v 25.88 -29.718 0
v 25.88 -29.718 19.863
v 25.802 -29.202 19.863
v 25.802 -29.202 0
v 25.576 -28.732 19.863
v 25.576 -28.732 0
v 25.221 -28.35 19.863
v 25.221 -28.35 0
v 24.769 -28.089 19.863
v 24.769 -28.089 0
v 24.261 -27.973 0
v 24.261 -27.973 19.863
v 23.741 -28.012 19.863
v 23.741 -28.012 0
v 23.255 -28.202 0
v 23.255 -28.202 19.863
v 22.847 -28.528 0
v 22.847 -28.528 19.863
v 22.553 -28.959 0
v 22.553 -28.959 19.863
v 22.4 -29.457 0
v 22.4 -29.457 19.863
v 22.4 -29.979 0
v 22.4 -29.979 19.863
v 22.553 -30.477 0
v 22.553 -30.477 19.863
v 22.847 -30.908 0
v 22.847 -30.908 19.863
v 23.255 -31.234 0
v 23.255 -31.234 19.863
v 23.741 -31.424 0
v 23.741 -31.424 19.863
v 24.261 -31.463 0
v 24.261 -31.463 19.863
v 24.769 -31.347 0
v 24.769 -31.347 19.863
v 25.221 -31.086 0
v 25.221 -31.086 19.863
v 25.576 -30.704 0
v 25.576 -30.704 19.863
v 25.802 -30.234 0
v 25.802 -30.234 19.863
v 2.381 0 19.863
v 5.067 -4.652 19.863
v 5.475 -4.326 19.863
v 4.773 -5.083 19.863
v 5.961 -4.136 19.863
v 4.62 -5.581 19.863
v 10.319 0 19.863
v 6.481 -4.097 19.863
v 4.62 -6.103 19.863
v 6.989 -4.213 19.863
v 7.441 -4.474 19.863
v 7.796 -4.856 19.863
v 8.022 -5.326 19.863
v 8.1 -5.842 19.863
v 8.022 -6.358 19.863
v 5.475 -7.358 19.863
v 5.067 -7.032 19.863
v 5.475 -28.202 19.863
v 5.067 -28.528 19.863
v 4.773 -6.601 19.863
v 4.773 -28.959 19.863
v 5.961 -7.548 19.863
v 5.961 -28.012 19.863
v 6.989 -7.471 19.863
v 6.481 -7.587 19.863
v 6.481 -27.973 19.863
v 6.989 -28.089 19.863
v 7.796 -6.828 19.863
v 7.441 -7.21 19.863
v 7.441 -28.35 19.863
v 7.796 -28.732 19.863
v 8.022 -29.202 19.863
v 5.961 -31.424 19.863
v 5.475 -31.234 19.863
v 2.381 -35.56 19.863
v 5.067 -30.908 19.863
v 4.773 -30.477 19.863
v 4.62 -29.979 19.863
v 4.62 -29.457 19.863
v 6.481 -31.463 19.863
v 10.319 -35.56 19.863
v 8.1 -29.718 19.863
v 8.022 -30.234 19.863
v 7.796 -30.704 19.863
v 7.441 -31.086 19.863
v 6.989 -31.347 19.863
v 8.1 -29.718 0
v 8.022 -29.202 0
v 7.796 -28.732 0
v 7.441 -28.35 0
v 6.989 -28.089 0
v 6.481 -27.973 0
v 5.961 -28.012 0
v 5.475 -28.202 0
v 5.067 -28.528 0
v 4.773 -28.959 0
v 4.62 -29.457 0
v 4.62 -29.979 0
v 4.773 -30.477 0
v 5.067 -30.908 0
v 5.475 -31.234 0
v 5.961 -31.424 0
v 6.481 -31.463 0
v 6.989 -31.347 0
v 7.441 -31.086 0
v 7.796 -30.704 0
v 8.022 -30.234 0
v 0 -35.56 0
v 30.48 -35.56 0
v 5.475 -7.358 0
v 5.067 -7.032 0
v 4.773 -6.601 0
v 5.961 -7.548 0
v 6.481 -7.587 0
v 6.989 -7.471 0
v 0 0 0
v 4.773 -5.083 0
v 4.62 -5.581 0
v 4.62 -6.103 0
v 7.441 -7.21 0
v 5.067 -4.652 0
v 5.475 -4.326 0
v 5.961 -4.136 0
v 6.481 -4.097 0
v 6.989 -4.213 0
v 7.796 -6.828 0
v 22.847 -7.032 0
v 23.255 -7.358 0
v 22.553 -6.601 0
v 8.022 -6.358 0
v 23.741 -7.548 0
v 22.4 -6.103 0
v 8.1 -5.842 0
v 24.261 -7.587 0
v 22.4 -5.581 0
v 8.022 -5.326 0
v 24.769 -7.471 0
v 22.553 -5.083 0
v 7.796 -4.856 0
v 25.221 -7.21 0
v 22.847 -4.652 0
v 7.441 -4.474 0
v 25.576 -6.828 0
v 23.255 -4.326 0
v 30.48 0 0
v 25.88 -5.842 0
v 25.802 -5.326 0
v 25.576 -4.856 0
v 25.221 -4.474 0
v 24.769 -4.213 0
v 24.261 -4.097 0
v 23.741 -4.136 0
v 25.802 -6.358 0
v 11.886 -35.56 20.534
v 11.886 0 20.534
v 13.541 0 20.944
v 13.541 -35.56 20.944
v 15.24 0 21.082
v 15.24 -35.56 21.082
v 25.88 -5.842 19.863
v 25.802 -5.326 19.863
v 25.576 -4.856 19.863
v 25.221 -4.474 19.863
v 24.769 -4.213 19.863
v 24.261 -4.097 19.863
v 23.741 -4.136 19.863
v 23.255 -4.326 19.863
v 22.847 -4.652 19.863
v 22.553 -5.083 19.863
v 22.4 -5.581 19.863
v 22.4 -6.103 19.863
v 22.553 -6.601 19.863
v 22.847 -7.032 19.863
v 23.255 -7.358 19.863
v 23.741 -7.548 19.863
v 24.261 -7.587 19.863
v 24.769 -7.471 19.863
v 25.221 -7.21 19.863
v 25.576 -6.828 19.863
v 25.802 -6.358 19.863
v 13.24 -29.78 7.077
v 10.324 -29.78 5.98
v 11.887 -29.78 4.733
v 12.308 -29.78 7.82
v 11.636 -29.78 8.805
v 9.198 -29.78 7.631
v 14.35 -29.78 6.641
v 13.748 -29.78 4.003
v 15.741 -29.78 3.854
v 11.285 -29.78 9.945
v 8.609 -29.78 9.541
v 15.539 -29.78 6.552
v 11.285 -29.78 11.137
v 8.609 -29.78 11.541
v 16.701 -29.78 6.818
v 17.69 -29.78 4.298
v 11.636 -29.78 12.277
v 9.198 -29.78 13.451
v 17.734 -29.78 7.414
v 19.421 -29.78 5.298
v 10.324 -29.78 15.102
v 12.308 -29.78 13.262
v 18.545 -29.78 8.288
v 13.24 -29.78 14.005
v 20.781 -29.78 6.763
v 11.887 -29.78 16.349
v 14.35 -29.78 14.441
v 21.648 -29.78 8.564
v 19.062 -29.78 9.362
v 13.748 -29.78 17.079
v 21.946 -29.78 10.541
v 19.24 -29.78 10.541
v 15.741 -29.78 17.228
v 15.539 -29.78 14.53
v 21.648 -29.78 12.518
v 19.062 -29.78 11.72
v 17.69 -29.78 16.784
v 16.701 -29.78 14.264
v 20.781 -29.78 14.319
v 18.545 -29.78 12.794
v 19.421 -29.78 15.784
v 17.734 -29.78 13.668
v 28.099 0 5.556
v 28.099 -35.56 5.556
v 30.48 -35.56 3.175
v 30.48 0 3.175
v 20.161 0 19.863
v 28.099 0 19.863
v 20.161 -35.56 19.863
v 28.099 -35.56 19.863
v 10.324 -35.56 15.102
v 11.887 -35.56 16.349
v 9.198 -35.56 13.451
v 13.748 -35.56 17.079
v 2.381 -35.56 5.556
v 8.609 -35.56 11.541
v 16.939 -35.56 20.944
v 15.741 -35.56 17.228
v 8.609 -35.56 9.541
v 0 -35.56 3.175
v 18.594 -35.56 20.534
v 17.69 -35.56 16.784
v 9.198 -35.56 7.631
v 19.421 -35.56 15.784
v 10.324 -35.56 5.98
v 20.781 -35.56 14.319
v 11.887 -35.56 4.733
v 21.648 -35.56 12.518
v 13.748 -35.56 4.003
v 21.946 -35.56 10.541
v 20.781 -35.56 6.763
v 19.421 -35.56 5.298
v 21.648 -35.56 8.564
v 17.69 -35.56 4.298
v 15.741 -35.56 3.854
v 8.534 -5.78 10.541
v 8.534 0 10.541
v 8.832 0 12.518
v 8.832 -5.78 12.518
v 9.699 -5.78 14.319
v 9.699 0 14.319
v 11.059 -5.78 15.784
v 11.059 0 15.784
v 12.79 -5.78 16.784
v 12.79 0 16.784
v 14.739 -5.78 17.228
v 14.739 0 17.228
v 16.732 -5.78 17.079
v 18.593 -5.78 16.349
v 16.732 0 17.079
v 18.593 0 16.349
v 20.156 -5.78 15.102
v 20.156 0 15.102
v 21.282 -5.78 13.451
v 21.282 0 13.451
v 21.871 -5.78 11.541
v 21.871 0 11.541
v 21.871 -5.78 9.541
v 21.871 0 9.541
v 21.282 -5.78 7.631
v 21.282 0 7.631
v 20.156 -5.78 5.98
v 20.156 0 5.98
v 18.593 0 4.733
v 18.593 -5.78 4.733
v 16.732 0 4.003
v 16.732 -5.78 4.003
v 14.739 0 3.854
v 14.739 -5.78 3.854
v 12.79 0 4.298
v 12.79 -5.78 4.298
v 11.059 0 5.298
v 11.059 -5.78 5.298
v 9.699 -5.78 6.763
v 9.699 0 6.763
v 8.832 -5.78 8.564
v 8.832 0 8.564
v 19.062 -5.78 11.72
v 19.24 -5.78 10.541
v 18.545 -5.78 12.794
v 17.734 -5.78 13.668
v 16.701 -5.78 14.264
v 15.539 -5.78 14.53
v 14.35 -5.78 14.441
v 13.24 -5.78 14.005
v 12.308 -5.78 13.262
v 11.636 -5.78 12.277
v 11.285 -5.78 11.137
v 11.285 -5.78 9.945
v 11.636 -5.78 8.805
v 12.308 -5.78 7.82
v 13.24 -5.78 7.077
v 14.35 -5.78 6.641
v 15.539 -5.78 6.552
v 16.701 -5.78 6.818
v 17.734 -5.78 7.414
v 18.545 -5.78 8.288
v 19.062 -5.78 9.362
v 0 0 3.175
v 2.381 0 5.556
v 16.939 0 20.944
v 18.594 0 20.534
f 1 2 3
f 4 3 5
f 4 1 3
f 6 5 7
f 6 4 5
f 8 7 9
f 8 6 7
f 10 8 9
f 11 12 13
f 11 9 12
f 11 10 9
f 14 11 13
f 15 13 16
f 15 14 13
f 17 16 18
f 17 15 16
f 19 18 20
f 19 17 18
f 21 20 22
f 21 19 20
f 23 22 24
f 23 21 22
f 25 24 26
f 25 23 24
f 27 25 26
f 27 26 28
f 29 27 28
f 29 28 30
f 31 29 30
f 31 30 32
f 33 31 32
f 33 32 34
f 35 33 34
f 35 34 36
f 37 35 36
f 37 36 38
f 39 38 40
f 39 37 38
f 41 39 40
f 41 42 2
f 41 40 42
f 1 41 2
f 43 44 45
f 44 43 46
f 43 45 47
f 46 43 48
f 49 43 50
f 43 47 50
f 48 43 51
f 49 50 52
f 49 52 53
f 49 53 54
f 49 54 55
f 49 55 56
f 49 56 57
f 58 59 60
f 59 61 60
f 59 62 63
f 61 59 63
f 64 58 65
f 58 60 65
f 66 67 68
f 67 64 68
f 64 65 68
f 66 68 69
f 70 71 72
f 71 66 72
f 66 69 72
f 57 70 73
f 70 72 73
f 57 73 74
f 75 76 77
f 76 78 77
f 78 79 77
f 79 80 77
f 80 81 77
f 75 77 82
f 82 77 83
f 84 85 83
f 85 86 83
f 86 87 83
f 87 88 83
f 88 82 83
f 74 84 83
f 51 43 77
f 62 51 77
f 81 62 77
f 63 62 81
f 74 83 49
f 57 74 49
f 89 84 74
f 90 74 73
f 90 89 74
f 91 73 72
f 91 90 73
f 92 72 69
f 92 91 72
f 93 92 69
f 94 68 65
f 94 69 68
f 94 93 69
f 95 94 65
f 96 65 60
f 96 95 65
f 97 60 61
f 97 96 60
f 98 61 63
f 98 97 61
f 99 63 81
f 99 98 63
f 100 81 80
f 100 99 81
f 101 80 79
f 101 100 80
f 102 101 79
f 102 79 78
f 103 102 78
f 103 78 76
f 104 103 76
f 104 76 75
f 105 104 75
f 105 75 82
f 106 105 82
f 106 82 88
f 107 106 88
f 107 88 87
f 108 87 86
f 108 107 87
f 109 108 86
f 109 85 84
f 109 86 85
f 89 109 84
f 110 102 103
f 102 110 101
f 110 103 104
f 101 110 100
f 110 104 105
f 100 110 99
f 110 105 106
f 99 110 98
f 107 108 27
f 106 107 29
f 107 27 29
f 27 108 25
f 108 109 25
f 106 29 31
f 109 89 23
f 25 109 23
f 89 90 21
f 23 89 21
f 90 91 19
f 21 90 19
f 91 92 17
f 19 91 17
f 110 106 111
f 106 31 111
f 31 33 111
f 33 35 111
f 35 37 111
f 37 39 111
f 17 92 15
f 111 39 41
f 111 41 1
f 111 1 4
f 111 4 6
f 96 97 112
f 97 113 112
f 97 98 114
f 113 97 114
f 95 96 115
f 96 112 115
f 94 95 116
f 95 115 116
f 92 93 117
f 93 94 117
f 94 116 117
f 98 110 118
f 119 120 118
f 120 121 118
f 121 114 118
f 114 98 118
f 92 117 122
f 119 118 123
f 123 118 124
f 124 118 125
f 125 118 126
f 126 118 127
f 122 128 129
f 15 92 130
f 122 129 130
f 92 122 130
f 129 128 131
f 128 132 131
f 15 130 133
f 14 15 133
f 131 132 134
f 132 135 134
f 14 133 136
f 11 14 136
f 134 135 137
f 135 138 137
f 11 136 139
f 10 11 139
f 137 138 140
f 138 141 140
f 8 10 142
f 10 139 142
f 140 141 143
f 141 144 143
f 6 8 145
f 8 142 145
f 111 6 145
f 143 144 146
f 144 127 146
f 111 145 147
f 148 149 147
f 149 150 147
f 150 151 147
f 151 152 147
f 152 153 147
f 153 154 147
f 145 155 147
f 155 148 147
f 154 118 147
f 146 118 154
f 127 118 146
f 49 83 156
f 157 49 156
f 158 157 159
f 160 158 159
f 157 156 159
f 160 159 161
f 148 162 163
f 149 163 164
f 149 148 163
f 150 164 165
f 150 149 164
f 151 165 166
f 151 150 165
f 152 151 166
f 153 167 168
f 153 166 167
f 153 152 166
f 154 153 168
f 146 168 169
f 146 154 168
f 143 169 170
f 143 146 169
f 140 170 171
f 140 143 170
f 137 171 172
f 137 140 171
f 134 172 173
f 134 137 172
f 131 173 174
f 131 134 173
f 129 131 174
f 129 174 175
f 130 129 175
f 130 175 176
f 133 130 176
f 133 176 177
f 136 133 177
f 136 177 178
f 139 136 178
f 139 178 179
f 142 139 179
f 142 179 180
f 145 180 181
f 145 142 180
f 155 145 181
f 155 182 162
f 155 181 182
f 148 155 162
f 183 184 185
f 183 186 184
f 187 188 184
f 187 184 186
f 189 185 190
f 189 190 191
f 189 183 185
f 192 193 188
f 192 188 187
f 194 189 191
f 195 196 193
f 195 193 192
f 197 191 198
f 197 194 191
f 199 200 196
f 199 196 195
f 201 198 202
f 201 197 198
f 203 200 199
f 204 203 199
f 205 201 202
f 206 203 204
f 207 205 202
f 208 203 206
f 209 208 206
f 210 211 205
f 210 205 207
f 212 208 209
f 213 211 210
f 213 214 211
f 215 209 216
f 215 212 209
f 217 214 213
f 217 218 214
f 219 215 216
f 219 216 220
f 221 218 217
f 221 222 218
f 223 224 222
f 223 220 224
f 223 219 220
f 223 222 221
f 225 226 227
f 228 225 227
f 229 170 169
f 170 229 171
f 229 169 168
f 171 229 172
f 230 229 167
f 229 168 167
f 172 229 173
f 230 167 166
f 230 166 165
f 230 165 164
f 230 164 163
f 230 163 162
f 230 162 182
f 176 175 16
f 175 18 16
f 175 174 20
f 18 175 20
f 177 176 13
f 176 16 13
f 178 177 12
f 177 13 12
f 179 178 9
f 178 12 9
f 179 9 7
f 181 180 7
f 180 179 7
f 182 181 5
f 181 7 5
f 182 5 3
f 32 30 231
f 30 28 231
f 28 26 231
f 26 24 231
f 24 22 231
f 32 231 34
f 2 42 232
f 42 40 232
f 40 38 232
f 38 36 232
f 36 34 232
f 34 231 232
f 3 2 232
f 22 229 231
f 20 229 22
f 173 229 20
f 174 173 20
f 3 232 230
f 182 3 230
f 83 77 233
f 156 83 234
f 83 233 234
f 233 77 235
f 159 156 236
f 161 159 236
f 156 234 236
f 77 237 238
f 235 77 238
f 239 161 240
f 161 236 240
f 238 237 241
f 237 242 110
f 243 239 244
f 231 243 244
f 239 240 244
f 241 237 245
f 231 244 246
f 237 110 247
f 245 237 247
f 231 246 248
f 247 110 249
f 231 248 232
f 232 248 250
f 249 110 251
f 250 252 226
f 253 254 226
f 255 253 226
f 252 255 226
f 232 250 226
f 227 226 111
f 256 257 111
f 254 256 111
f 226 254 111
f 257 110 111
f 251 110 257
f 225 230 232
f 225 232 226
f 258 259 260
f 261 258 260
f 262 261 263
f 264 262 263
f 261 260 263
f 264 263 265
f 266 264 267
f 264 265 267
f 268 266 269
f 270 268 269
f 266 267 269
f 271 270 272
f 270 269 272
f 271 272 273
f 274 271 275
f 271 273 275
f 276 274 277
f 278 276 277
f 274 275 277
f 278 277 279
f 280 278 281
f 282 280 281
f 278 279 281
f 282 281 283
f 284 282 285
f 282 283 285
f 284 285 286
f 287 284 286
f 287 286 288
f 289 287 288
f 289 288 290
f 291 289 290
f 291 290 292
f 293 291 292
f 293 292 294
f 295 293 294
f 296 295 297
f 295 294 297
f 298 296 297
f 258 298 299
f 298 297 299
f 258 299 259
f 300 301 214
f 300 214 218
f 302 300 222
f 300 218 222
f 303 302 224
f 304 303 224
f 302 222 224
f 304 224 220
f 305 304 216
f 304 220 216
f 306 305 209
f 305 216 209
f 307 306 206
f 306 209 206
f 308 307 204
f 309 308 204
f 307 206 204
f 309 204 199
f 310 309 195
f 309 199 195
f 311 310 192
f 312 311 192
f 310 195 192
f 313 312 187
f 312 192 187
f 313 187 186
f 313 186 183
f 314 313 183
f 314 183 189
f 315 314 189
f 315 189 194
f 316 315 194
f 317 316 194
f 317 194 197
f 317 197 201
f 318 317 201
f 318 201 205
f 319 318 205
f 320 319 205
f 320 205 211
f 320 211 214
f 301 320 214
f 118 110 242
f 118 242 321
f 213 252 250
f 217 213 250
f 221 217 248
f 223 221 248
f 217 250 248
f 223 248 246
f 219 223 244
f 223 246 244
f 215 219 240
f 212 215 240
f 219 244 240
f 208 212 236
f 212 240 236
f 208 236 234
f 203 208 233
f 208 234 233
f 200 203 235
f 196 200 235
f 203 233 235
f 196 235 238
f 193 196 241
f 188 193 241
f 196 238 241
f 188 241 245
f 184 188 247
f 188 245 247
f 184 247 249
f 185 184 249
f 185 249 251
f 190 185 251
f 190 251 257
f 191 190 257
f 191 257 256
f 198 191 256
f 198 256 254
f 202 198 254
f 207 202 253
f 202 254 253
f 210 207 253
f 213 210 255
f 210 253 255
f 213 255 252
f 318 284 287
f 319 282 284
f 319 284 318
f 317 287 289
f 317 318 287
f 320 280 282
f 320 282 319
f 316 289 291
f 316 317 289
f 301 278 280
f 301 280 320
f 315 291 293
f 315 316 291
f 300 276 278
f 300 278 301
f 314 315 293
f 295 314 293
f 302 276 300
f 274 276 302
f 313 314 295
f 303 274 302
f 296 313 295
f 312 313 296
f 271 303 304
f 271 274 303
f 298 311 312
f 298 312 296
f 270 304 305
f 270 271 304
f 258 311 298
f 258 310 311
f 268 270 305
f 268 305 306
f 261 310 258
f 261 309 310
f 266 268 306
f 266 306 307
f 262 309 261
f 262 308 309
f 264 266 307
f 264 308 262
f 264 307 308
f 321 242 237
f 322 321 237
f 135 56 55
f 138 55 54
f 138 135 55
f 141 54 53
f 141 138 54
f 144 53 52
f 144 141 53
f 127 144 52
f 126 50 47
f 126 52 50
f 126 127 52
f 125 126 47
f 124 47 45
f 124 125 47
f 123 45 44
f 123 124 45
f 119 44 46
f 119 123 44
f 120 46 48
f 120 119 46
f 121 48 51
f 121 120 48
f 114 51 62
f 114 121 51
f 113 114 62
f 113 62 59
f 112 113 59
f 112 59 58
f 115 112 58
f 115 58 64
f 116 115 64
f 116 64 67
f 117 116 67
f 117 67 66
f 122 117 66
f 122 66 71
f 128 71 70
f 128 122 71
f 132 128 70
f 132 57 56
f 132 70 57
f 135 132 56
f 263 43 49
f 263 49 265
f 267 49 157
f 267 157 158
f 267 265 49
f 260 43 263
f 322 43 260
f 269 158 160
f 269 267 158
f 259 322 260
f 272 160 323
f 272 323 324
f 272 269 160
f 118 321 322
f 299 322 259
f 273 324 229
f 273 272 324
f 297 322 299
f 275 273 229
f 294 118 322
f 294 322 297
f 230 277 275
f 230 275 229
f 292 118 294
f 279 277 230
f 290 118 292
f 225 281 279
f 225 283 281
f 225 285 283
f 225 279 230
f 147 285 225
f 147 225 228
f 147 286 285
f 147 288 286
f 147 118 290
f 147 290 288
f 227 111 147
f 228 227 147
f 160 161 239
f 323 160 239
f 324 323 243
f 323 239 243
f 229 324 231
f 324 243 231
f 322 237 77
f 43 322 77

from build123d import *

# Parameters (mm, degrees)
F0_W     = 30.48
F0_H     = 35.56
F0_R     = 1.75
F1_DEPTH = 21.082
F2_R     = 4
F3_DEPTH = 35.56
F4_R     = 6.706248
F5_DEPTH = 5.779999
F6_R     = 6.706248
F7_DEPTH = 5.779999


with BuildPart() as f1:
    # F0 (on Top) → F1 (new body)
    with BuildSketch(Plane.XY):
        with Locations((15.24, -17.78)):
            Rectangle(F0_W, F0_H)
        with Locations((6.35, -29.718)):
            Circle(F0_R, mode=Mode.SUBTRACT)
        with Locations((24.13, -29.718)):
            Circle(F0_R, mode=Mode.SUBTRACT)
        with Locations((6.35, -5.842)):
            Circle(F0_R, mode=Mode.SUBTRACT)
        with Locations((24.13, -5.842)):
            Circle(F0_R, mode=Mode.SUBTRACT)
    extrude(amount=F1_DEPTH)

    # F2 (on face) → F3 (cut, through all)
    with BuildSketch(Plane.XZ.offset(35.56)):
        with Locations((15.24, 10.541)):
            Circle(F2_R)
        with BuildLine():
            ThreePointArc((10.31875, 19.862694), (12.704975, 20.772634), (15.24, 21.082))
            Line((15.24, 21.082), (0, 21.082))
            Line((0, 21.082), (0, 3.175))
            Line((0, 3.175), (2.38125, 5.55625))
            Line((2.38125, 5.55625), (2.38125, 19.862694))
            Line((2.38125, 19.862694), (10.31875, 19.862694))
        make_face()
        with BuildLine():
            ThreePointArc((15.24, 21.082), (17.775025, 20.772634), (20.16125, 19.862694))
            Line((20.16125, 19.862694), (28.09875, 19.862694))
            Line((28.09875, 19.862694), (28.09875, 5.55625))
            Line((28.09875, 5.55625), (30.48, 3.175))
            Line((30.48, 3.175), (30.48, 21.082))
            Line((30.48, 21.082), (15.24, 21.082))
        make_face()
    extrude(amount=-F3_DEPTH, mode=Mode.SUBTRACT)

    # F4 (on face) → F5 (cut)
    with BuildSketch(Plane.XZ.offset(35.56)):
        with Locations((15.24, 10.541)):
            Circle(F4_R)
    extrude(amount=-F5_DEPTH, mode=Mode.SUBTRACT)

    # F6 (on face) → F7 (cut)
    with BuildSketch(Plane(origin=(0, 0, 0), x_dir=(-1, 0, 0), z_dir=(0, 1, 0))):
        with Locations((-15.24, 10.541)):
            Circle(F6_R)
    extrude(amount=-F7_DEPTH, mode=Mode.SUBTRACT)


solid = f1.part
